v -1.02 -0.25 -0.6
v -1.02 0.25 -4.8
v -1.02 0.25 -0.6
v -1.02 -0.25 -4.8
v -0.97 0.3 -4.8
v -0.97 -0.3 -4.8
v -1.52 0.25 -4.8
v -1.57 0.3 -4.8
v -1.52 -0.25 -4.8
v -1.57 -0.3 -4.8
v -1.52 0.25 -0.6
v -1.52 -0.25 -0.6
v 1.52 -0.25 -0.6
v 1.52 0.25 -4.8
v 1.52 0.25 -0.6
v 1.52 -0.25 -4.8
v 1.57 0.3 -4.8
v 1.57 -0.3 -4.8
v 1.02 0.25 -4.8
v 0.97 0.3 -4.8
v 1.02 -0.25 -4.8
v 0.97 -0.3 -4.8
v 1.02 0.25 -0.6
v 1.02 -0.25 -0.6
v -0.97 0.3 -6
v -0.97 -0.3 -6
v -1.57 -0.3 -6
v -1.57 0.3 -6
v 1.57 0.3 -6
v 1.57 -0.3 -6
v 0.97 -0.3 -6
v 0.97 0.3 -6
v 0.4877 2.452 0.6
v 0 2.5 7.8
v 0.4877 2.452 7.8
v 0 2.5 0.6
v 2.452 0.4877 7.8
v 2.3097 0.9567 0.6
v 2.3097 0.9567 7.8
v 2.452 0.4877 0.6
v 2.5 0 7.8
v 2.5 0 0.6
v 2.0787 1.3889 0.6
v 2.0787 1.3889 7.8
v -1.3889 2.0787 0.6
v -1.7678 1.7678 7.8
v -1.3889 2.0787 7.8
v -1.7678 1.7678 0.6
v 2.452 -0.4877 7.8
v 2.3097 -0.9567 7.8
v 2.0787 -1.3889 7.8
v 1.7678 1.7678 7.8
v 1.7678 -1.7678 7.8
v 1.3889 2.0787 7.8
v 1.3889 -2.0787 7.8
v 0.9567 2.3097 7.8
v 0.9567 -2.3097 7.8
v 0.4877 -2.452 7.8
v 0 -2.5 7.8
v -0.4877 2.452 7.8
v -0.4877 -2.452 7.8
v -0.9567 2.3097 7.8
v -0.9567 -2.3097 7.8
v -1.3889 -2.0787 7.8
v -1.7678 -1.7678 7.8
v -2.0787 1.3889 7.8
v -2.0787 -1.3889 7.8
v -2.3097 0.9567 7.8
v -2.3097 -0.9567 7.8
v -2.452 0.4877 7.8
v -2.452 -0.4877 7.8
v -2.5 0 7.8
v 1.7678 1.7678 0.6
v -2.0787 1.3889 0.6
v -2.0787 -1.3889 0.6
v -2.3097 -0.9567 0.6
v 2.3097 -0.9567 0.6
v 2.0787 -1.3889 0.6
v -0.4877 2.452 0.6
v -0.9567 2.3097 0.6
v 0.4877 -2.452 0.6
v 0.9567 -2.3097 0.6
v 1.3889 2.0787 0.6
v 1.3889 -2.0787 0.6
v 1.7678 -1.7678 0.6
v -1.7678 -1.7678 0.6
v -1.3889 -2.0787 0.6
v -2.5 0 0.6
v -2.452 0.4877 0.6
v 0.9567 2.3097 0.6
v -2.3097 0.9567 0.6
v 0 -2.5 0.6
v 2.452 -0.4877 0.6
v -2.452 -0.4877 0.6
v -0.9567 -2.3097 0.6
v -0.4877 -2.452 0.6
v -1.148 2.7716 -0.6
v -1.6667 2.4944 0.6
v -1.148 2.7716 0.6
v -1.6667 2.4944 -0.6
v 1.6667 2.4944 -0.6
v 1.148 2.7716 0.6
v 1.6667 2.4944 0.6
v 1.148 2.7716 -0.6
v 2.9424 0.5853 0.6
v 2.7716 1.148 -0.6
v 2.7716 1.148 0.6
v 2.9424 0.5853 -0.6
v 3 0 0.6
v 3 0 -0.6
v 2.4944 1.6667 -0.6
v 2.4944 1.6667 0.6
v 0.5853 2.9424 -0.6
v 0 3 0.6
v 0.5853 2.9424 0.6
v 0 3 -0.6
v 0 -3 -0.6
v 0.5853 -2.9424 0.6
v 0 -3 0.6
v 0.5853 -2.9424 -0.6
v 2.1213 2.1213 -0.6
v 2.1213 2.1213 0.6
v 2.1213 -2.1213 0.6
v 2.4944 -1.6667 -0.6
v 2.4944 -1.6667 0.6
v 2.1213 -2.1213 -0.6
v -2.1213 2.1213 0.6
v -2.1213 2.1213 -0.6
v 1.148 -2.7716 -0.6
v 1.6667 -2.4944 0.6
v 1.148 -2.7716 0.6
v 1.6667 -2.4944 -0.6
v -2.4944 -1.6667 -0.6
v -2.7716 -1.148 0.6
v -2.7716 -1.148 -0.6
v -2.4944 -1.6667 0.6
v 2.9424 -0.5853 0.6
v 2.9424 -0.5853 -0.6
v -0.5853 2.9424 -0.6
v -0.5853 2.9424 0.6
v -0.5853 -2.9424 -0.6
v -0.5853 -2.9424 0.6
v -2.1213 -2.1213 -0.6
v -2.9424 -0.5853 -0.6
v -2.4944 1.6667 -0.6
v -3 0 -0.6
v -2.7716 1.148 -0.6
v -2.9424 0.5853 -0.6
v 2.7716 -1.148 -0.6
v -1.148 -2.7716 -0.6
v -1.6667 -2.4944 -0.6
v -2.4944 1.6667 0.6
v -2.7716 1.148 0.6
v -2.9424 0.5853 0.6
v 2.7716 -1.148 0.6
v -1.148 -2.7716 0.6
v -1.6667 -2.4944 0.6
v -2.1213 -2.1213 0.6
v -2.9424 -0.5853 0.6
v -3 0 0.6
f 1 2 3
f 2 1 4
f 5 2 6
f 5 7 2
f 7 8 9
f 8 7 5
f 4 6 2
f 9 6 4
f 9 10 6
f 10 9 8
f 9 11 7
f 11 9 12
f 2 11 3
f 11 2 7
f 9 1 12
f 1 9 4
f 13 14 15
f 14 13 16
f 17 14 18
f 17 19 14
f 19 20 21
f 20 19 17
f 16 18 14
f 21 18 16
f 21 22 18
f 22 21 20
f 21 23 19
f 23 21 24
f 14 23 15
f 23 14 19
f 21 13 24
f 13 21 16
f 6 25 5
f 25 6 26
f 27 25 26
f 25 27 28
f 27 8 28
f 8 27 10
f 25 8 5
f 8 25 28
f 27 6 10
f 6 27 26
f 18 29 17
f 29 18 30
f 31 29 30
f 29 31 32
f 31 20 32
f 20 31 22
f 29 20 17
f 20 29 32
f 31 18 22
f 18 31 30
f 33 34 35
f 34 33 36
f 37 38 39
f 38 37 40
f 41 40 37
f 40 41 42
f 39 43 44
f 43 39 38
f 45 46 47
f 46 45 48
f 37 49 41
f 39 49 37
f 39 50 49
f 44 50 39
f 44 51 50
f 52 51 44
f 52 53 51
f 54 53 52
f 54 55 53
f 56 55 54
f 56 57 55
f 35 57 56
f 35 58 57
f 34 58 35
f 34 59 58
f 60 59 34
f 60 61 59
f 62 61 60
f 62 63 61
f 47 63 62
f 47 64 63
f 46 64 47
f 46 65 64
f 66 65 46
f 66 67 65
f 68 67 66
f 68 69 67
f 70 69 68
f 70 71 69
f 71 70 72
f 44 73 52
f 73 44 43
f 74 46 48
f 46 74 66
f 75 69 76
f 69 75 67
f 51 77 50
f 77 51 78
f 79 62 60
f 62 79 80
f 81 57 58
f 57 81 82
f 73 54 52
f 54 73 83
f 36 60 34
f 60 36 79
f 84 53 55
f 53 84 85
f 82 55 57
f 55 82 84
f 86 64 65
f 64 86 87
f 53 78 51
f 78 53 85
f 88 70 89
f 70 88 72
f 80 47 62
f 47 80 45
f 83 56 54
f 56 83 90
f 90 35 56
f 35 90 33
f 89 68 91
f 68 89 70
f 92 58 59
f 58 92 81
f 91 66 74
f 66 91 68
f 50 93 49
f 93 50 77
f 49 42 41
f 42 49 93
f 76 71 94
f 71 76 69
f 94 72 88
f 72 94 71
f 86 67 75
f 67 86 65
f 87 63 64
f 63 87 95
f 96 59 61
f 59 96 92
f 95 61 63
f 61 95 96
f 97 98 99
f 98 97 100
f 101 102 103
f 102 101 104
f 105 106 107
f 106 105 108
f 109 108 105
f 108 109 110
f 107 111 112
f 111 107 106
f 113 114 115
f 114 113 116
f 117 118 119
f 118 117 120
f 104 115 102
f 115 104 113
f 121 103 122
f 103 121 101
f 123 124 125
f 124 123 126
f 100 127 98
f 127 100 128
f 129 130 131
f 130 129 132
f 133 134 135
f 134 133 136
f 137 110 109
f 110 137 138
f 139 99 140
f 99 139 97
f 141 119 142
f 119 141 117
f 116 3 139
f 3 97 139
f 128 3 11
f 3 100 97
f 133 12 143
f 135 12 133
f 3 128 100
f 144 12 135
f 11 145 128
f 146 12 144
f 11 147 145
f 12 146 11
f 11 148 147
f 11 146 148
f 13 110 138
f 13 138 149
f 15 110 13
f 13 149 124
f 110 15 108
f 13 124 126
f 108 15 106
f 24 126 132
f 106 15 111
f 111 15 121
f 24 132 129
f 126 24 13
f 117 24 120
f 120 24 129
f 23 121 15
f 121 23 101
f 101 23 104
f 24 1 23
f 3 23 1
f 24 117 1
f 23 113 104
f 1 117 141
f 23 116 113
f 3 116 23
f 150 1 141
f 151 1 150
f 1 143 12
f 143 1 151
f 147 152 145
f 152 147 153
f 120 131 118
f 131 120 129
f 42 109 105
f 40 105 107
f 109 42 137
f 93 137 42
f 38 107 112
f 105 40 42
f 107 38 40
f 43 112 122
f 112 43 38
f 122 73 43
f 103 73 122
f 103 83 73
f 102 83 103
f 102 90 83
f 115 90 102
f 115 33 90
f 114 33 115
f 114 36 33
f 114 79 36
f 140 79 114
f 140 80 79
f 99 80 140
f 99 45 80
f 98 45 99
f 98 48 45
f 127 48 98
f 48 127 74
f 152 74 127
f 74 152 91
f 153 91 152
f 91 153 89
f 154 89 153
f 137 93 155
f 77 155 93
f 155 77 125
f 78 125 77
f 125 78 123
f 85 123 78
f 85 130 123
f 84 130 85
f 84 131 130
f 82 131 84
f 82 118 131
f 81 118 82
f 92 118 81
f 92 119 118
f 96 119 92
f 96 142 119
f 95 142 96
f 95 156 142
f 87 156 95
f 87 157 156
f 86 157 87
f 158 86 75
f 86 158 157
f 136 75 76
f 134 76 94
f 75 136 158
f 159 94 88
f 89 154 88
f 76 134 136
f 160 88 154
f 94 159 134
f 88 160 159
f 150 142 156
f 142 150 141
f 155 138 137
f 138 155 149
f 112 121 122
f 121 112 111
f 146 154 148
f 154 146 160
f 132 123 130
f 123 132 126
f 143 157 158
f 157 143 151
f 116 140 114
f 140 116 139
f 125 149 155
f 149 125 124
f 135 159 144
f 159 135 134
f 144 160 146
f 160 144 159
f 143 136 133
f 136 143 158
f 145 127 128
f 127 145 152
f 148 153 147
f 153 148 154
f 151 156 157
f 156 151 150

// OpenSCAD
// Parameters
led_diameter = 5; //[2.5:10:0.1]
led_height = 8; //[4:16:0.1]
rim_thickness = 1.2; //[0.6:2.4:0.1]
rim_diameter = 6; //[3:12:0.1]
lead_pitch = 2.54; //[1.27:5.08:0.01]
lead_thickness = 0.5; //[0.25:1:0.01]
lead_length = 5; //[2.5:20:0.1]
right_angle = 0; //[0:10:0.1]
solder_tip_length = 1.2; //[0.6:3:0.1]
overlap = 0.8; //[0.5:2:0.1]

// LED module with detailed geometry
module led() {
  color("red") {
    // LED Body
    translate([0, 0, rim_thickness/2 + led_height/2 - overlap])
      cylinder(r=led_diameter/2, h=led_height, center=true, $fn=32);
    
    // LED Rim
    translate([0, 0, 0])
      cylinder(r=rim_diameter/2, h=rim_thickness, center=true, $fn=32);
    
    // Leads
    union() {
      // Left Lead
      translate([-lead_pitch/2, 0, -rim_thickness/2 - lead_length/2 + overlap])
        cube([lead_thickness, lead_thickness, lead_length], center=true);
      
      // Right Lead
      translate([lead_pitch/2, 0, -rim_thickness/2 - lead_length/2 + overlap])
        cube([lead_thickness, lead_thickness, lead_length], center=true);
      
      // Solder Tips
      translate([-lead_pitch/2, 0, -rim_thickness/2 - lead_length - solder_tip_length/2 + overlap])
        cube([lead_thickness*1.2, lead_thickness*1.2, solder_tip_length], center=true);
      
      translate([lead_pitch/2, 0, -rim_thickness/2 - lead_length - solder_tip_length/2 + overlap])
        cube([lead_thickness*1.2, lead_thickness*1.2, solder_tip_length], center=true);
      
      // Right Angle Bend (if applicable)
      if (right_angle > 0) {
        translate([-lead_pitch/2, -right_angle/2 - lead_thickness/2 + overlap, -rim_thickness/2 - lead_thickness/2 + overlap])
          cube([lead_thickness, right_angle, lead_thickness], center=true);
        
        translate([lead_pitch/2, -right_angle/2 - lead_thickness/2 + overlap, -rim_thickness/2 - lead_thickness/2 + overlap])
          cube([lead_thickness, right_angle, lead_thickness], center=true);
      }
    }
  }
}

// Assembly
module assembly() {
  led();
}

assembly();
